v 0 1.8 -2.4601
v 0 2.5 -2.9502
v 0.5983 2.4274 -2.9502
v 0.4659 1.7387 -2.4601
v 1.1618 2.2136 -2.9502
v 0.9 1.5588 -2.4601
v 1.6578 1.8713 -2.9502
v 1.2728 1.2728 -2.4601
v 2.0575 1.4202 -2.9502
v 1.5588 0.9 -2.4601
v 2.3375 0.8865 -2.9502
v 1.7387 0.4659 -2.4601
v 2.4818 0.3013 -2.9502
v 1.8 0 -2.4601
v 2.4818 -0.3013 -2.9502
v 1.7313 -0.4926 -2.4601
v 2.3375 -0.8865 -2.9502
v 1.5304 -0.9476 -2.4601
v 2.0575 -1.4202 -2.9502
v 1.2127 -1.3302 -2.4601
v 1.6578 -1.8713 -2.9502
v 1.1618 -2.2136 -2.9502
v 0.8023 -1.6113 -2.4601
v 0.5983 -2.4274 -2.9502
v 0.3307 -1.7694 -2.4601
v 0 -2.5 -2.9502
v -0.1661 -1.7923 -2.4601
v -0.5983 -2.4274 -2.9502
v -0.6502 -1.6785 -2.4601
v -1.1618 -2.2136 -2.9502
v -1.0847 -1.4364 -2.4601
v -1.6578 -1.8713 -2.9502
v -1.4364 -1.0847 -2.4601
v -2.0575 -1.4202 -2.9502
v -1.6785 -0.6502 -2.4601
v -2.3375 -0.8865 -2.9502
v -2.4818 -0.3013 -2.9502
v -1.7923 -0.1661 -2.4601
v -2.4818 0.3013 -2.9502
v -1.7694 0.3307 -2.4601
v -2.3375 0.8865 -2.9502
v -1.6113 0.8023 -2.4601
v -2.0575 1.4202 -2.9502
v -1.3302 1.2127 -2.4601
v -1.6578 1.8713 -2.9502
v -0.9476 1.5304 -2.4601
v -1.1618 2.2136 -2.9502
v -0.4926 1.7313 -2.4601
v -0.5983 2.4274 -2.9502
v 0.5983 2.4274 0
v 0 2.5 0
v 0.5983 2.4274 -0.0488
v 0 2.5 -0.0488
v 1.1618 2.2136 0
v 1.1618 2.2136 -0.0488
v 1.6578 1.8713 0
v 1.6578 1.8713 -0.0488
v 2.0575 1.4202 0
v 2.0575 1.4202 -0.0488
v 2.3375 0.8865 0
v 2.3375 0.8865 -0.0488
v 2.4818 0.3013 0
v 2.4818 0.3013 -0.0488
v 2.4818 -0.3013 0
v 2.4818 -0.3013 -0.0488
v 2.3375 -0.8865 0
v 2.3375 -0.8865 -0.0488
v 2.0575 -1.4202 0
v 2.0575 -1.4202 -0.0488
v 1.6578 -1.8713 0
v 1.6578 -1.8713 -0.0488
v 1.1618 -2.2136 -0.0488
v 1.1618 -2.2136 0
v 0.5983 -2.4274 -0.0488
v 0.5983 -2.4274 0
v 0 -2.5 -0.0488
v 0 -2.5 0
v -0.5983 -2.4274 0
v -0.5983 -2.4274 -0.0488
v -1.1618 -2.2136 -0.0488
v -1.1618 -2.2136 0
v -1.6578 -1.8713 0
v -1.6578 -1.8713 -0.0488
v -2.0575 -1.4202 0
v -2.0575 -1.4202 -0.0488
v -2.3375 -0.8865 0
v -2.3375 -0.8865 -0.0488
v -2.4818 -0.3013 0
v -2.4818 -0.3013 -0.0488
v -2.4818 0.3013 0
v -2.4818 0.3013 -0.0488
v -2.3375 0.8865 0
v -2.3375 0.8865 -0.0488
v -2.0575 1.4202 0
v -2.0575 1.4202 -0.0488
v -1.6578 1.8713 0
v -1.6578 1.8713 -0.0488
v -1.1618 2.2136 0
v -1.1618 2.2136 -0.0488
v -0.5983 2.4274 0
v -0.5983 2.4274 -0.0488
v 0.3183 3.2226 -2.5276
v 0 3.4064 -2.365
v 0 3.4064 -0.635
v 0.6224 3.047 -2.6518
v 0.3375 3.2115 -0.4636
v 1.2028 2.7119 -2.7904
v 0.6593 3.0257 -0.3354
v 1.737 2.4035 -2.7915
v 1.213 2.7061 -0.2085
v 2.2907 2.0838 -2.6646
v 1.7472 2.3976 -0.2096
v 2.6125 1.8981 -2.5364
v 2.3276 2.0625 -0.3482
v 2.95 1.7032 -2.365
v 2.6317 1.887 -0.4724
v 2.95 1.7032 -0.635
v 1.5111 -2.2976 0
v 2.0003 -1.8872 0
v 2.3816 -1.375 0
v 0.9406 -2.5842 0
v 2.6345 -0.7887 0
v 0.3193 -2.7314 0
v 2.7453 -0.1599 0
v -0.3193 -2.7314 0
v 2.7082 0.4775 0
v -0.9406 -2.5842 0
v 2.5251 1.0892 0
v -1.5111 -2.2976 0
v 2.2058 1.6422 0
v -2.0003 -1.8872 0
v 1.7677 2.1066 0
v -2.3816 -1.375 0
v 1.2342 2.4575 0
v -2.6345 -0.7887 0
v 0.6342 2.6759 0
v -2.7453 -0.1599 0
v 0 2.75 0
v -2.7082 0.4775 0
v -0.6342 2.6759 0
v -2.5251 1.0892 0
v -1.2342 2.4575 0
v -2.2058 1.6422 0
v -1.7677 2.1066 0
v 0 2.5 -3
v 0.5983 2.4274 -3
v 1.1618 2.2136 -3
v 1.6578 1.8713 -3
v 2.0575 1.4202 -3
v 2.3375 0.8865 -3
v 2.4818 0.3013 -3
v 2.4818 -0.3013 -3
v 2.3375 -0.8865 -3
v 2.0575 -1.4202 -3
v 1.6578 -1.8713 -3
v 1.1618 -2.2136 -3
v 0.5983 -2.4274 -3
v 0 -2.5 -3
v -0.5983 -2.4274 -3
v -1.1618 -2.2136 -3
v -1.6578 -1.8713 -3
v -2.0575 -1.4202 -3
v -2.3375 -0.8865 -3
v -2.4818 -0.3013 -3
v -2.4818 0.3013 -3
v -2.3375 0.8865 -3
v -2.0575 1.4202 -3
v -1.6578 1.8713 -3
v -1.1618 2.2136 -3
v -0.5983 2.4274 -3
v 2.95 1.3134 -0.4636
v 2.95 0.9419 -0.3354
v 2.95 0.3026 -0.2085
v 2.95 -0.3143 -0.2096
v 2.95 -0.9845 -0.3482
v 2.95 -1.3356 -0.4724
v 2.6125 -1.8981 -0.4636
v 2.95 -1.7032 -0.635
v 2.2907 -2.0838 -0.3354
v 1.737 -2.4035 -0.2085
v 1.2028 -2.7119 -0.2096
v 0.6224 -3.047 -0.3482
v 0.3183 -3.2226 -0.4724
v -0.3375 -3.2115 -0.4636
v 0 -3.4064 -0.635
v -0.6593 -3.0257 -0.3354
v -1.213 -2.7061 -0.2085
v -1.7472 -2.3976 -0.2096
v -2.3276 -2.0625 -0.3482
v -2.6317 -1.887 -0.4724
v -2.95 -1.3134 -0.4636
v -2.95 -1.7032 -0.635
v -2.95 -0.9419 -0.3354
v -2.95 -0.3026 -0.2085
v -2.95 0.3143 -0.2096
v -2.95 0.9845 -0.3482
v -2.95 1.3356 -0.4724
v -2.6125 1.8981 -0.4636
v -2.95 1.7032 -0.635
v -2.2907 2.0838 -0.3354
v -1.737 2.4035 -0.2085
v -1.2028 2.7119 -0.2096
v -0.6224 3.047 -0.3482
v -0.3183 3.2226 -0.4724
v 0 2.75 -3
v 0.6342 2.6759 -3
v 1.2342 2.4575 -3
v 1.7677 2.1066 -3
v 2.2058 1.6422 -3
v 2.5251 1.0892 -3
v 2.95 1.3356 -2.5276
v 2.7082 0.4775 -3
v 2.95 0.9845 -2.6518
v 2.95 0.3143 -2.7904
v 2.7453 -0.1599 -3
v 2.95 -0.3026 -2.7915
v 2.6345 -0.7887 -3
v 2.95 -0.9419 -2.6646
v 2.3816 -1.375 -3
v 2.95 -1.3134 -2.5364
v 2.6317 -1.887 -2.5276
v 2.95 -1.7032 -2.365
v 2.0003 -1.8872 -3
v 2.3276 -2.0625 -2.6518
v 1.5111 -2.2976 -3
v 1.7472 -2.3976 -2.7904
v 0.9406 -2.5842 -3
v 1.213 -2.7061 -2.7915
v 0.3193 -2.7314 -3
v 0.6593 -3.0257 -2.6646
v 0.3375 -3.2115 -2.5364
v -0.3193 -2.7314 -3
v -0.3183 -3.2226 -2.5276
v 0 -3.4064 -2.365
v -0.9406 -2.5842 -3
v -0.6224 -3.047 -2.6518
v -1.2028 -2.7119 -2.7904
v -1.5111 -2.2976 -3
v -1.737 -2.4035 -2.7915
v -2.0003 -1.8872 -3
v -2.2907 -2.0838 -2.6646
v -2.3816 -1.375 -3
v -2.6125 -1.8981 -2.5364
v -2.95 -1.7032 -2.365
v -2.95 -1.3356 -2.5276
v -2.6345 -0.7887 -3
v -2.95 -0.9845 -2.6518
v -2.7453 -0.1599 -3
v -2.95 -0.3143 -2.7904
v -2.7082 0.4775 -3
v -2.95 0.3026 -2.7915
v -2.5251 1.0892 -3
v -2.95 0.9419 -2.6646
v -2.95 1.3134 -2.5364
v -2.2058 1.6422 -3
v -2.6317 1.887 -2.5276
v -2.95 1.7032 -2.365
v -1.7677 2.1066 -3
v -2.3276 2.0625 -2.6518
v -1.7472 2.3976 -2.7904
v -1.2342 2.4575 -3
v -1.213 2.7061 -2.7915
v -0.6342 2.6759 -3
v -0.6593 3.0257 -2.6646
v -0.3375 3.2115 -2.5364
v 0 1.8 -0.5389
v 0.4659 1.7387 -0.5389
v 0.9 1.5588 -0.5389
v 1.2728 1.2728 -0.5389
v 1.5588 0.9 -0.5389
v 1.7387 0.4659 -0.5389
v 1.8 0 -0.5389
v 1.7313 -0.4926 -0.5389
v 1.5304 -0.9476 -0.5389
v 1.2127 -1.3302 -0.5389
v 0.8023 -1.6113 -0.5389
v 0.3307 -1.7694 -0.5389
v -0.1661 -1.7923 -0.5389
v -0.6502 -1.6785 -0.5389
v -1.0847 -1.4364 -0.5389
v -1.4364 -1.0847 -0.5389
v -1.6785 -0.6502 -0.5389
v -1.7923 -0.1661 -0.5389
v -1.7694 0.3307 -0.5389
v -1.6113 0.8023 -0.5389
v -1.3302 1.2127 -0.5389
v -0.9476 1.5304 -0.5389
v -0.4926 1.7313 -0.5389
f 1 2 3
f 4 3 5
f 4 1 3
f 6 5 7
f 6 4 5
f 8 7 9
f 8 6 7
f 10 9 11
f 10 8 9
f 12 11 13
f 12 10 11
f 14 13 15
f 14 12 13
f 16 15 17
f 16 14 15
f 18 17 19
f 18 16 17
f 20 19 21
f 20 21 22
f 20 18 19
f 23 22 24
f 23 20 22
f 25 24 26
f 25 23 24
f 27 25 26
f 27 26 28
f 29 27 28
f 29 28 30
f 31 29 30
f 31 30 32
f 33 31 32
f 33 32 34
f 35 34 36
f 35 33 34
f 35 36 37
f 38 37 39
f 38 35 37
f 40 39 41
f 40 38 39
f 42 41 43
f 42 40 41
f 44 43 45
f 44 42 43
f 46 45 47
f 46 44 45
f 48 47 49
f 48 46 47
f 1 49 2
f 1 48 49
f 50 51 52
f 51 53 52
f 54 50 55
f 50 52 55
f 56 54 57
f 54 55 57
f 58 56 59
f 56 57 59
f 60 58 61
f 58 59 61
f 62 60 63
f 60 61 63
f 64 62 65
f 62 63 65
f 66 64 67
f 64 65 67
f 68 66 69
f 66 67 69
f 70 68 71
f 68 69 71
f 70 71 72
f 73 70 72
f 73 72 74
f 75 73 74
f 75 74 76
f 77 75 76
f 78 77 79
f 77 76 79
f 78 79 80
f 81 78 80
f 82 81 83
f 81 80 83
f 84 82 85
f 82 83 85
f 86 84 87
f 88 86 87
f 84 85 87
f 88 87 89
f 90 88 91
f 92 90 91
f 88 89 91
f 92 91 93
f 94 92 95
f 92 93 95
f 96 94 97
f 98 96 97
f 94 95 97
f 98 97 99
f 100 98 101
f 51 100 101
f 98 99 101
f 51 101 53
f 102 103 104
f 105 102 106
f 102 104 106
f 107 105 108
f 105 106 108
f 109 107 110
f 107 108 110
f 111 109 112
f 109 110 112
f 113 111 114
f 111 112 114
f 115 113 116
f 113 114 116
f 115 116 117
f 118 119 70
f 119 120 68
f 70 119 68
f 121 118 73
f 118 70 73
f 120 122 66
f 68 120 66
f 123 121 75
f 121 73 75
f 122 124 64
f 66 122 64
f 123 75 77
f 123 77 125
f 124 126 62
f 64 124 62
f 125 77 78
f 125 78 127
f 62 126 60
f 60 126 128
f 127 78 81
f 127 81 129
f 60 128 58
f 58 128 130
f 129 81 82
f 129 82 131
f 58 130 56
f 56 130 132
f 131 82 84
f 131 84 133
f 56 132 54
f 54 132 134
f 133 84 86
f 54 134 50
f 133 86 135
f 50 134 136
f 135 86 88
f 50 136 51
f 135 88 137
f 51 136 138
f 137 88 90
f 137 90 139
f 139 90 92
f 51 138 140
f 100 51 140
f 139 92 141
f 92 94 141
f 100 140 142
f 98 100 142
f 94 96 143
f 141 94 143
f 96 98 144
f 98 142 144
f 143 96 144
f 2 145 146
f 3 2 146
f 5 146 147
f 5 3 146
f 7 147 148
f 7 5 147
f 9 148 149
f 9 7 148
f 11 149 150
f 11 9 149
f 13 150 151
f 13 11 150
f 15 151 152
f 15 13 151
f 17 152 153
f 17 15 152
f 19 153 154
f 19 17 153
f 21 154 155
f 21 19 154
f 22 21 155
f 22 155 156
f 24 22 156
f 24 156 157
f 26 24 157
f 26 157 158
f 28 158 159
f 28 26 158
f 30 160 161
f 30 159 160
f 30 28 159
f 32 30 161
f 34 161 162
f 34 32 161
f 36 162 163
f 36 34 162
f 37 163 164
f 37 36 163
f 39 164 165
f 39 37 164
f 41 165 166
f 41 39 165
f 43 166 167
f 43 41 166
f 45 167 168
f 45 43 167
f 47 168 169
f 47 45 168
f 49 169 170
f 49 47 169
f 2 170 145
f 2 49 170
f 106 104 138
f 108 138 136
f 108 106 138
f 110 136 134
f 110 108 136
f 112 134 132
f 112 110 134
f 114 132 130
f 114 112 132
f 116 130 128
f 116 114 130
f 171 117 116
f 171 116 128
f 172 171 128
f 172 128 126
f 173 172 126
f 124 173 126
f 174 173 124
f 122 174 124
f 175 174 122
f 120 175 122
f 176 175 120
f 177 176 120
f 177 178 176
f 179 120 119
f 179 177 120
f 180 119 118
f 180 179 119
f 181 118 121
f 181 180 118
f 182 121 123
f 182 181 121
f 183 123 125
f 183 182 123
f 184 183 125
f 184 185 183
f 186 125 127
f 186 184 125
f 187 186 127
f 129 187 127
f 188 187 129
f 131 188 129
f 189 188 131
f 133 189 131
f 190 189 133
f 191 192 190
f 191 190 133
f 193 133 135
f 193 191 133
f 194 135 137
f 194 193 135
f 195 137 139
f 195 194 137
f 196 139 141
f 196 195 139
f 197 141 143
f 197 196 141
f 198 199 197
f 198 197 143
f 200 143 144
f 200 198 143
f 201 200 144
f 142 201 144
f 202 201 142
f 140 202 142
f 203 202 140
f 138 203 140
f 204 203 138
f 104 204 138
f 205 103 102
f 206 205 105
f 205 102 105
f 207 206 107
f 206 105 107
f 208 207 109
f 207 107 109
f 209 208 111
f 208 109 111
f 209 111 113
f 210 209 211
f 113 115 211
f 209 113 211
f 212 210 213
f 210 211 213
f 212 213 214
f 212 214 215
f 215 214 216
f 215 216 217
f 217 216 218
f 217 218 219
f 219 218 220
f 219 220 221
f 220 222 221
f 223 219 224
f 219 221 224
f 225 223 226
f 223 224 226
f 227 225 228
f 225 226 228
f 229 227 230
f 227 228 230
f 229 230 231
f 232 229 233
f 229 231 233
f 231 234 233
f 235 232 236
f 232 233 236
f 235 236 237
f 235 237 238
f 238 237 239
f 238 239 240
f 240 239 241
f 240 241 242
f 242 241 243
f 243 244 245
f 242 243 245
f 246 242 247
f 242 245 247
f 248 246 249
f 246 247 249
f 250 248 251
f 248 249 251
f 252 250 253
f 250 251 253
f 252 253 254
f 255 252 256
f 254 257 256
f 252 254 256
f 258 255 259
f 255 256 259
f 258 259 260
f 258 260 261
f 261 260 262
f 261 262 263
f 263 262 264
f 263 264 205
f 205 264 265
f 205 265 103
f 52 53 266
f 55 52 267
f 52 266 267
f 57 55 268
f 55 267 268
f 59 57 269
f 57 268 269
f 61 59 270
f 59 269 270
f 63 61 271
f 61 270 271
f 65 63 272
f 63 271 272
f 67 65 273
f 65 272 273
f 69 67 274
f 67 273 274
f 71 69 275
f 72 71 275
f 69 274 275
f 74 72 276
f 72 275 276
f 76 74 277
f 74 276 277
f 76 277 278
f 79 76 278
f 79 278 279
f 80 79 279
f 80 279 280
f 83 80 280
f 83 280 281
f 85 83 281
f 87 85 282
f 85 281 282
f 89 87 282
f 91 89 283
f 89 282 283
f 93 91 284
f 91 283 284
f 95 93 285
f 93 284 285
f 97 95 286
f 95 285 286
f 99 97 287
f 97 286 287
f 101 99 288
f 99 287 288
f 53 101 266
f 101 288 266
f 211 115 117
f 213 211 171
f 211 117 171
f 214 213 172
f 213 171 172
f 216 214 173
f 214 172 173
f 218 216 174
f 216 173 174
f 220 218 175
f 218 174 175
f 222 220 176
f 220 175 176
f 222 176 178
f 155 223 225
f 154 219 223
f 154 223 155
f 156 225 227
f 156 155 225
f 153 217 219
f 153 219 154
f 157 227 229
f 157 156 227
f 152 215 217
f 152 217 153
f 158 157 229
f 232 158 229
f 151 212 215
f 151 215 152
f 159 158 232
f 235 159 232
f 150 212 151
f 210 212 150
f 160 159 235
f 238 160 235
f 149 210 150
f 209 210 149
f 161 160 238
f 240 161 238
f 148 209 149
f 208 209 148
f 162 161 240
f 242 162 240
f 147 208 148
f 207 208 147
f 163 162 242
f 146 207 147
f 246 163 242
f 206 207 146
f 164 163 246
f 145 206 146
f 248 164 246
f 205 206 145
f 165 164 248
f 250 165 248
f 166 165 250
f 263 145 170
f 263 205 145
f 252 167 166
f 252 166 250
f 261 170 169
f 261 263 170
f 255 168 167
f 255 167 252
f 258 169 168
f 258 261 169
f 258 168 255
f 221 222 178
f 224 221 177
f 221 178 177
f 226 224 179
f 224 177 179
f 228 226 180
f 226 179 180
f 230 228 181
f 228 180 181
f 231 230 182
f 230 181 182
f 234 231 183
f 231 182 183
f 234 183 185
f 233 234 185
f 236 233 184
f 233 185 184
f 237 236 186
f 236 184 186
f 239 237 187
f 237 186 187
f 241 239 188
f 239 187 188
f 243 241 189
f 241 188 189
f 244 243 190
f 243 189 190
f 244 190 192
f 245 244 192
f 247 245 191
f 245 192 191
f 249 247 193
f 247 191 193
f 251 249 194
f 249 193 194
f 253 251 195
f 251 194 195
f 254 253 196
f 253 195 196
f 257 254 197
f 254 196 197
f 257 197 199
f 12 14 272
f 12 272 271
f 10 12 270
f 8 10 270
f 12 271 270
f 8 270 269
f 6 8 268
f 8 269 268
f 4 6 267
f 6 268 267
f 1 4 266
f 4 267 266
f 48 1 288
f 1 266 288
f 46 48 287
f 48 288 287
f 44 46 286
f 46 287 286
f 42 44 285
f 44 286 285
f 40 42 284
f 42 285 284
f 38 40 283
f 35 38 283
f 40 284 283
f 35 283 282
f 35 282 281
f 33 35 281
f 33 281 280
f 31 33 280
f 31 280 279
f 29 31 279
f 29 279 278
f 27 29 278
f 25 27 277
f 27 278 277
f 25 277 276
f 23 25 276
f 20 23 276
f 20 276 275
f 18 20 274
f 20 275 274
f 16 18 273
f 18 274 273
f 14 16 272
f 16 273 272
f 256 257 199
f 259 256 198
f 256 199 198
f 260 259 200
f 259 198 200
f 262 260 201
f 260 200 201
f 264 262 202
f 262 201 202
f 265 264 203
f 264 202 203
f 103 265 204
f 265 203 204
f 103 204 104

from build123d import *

# Parameters (mm, degrees)
BASENUTSKE_R  = 1.8
BASENUT_DEPTH = 3


with BuildPart() as part:
    # BaseNutSke → BaseNut (new body)
    with BuildSketch(Plane.XY):
        Polygon((2.95, 1.703183294), (2.95, -1.703183294), (0, -3.406366588), (-2.95, -1.703183294), (-2.95, 1.703183294), (0, 3.406366588), align=None)
        Circle(BASENUTSKE_R, mode=Mode.SUBTRACT)
    extrude(amount=-BASENUT_DEPTH)

    # Sketch3 → Double-Chamfer (revolve, cut)
    with BuildSketch(Plane(origin=(0, 0, 0), x_dir=(0, 0, -1), z_dir=(1, 0, 0))):
        Polygon((3, 2.75), (2.365, 3.406366588), (2.365, 16.106366588), (15.7, 16.106366588), (15.7, 2.75), align=None)
        Polygon((0.635, 16.106366588), (-12.7, 16.106366588), (-12.7, 2.75), (0, 2.75), (0.635, 3.406366588), align=None)
    revolve(axis=Axis((0, 0, 0), (0, 0, -1)), mode=Mode.SUBTRACT)

    # Sketch5 → EndChamfer (revolve, cut)
    with BuildSketch(Plane(origin=(0, 0, 0), x_dir=(0, 0, -1), z_dir=(1, 0, 0))):
        Polygon((2.9502, 2.5), (1.891136098, 0.9875), (3.001, 0.9875), (3.001, 2.5), align=None)
        Polygon((-0.002, 2.5), (0.0488, 2.5), (1.107863902, 0.9875), (-0.002, 0.9875), align=None)
    revolve(axis=Axis((0, 0, -25.037505729), (0, 0, -1)), mode=Mode.SUBTRACT)


solid = part.part
